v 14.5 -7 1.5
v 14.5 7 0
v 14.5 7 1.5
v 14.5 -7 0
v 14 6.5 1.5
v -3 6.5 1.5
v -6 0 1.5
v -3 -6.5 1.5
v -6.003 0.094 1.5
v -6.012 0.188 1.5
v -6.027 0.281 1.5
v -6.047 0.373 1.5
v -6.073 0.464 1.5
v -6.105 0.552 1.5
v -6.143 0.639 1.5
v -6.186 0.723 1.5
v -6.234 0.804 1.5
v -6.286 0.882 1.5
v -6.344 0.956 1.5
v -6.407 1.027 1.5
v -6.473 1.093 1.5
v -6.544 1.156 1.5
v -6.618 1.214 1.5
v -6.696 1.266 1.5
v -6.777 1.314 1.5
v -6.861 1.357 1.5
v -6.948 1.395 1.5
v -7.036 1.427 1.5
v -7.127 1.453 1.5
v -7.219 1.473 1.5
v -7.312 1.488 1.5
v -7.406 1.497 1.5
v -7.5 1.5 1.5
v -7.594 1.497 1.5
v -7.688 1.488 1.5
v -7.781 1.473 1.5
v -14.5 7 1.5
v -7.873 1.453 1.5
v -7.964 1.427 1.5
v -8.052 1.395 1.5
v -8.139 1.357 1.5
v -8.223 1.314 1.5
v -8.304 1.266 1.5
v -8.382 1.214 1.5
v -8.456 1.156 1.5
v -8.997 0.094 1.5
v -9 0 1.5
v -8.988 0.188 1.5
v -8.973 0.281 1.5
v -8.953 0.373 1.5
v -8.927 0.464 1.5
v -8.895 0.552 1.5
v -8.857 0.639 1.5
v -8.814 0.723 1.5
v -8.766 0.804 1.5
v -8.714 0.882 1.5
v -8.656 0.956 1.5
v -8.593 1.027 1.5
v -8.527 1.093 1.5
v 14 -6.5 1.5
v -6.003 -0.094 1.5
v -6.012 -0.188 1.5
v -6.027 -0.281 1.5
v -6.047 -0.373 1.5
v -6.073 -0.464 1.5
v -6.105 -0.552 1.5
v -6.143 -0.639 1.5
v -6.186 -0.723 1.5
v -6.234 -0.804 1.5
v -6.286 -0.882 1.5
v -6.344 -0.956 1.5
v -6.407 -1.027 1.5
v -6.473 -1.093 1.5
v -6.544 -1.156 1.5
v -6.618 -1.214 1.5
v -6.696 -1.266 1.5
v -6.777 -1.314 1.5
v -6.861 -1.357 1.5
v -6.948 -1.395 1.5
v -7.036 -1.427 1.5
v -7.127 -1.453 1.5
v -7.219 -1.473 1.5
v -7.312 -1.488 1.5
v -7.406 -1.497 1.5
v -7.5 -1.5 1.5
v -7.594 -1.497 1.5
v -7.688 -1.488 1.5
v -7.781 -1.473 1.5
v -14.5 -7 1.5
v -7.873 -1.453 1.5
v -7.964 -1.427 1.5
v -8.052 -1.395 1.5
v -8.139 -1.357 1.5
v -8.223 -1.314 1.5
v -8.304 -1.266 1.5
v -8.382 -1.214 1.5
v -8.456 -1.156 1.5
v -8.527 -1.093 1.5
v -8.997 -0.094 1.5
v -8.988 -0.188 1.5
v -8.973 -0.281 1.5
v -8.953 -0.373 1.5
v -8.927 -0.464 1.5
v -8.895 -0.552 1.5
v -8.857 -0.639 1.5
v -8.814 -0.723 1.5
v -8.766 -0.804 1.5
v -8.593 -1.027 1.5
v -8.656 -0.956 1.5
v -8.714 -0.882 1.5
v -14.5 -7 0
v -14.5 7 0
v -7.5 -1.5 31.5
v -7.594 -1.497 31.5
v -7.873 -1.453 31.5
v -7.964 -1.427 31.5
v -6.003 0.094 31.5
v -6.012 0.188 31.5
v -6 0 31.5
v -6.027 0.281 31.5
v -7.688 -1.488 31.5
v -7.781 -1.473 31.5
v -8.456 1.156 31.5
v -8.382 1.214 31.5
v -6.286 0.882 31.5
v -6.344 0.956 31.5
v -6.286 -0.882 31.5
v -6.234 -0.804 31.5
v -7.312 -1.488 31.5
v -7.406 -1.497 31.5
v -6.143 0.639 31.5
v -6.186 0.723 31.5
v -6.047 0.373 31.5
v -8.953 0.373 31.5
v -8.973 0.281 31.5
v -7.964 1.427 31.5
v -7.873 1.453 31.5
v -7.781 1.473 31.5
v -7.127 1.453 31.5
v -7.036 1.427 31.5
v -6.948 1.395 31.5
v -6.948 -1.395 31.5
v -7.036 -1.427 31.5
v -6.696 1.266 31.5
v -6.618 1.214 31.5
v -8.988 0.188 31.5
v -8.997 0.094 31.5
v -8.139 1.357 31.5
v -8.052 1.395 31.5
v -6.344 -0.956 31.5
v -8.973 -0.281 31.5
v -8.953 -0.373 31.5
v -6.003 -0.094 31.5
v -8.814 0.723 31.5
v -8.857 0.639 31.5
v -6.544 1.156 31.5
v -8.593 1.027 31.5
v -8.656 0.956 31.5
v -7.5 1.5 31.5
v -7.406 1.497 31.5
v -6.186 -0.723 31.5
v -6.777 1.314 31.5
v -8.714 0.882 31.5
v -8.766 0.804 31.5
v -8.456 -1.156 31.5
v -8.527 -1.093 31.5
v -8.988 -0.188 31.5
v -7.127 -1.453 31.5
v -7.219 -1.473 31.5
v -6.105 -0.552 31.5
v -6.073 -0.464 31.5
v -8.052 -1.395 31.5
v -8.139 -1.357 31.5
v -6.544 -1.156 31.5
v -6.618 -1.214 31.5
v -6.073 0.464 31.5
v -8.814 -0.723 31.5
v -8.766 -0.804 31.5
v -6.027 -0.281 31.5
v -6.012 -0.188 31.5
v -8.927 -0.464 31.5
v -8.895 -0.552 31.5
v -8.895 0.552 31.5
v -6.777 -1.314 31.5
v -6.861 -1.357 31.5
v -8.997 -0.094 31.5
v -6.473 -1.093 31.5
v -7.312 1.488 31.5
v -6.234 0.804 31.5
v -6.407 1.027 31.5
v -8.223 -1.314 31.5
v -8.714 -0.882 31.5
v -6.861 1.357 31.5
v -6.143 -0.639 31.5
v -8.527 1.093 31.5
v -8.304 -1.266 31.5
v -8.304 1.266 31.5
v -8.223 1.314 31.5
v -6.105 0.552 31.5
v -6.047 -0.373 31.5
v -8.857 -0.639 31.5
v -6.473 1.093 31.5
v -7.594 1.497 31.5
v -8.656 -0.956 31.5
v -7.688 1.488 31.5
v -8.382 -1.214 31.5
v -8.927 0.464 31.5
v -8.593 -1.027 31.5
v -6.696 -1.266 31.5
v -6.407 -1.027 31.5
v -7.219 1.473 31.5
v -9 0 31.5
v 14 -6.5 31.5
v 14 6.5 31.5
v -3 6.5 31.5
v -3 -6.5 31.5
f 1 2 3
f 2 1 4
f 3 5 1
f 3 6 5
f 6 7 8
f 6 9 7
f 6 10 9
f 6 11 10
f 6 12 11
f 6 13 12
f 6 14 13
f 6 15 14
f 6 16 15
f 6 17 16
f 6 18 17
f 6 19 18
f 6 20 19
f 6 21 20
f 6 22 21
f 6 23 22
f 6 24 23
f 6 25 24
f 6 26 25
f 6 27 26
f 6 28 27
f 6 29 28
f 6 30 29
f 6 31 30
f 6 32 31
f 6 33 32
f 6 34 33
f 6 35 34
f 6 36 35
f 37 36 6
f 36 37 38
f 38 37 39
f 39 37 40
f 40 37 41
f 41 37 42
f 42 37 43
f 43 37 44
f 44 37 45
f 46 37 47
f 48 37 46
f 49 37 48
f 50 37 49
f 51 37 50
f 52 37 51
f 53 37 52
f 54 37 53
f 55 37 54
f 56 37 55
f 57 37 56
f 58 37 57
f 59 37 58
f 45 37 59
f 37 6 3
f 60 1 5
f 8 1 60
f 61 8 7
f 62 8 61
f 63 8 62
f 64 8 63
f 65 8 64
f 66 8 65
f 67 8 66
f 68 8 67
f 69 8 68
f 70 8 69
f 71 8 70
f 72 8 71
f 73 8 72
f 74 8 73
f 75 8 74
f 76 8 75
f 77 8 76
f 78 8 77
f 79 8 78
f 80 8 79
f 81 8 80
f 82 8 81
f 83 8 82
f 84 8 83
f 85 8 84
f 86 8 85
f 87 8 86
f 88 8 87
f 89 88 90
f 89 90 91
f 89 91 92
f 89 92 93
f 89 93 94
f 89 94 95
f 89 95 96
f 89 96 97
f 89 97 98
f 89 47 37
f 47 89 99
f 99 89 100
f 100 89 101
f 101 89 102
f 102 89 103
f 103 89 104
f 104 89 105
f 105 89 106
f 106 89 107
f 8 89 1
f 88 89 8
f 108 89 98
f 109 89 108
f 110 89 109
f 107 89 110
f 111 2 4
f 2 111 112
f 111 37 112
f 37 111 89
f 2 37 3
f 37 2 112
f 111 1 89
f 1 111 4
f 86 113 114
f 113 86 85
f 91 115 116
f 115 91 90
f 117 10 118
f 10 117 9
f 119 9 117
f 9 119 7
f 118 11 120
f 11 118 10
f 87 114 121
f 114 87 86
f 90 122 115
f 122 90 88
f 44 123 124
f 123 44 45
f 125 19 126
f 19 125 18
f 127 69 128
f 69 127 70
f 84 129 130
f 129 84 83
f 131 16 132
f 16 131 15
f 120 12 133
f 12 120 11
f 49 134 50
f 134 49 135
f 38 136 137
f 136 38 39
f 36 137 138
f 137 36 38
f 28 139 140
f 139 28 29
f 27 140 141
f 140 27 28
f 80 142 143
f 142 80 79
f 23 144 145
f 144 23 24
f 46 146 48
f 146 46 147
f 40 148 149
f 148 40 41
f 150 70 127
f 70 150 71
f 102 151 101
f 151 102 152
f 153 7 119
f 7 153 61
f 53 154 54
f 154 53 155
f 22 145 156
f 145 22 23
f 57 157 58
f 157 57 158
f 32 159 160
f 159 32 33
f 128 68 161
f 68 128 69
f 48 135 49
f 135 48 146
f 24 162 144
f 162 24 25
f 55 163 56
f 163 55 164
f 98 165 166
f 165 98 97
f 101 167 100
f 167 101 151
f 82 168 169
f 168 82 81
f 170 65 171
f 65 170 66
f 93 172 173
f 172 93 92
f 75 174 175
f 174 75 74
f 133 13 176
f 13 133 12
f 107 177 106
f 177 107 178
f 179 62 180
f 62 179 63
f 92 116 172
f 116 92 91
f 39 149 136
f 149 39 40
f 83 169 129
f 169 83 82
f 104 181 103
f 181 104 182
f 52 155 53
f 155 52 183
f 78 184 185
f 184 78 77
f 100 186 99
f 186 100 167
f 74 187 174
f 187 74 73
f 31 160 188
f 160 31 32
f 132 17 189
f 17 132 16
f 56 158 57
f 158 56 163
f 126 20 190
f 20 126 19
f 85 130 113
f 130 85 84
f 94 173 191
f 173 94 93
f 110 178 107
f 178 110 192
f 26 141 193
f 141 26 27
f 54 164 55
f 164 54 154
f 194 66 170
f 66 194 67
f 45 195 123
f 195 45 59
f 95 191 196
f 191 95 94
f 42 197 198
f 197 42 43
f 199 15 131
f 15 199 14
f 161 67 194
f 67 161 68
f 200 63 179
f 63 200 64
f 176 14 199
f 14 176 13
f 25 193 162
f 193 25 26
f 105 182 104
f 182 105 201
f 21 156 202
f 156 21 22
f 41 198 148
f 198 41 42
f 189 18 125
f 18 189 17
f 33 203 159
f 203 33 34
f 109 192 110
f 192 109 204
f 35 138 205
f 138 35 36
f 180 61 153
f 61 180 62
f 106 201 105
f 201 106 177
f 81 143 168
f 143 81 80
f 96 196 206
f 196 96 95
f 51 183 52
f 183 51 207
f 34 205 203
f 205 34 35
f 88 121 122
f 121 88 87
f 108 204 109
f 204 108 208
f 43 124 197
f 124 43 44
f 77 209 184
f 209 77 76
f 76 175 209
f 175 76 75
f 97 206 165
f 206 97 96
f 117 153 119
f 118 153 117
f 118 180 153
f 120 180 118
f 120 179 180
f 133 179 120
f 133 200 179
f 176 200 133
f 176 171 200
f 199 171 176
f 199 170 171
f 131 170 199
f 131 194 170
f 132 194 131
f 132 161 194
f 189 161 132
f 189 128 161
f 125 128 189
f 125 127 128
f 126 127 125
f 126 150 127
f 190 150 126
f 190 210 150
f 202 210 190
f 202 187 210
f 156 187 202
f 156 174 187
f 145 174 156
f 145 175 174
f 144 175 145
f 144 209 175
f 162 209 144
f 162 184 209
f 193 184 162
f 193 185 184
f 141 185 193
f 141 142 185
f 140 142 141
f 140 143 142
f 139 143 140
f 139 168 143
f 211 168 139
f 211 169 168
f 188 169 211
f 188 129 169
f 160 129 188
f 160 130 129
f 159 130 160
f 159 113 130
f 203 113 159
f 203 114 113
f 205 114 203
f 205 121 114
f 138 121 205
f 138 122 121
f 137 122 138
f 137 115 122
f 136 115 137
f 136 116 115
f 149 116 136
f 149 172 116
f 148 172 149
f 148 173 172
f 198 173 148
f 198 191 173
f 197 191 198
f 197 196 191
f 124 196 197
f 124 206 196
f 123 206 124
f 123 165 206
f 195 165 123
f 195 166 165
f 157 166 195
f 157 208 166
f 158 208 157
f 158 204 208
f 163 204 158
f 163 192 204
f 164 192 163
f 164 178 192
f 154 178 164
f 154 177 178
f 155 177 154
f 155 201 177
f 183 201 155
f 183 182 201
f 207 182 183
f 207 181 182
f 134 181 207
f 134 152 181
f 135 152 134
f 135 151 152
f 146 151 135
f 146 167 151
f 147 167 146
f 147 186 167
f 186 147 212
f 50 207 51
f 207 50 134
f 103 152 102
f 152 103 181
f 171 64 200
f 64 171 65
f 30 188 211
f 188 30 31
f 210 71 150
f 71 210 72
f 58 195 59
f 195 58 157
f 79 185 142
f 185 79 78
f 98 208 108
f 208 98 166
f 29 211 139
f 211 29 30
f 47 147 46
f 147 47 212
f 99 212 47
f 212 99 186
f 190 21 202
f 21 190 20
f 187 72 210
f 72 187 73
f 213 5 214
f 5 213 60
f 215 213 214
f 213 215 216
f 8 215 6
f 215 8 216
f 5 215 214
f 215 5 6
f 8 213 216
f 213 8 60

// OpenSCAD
module ArduinoUNO(espesorArduino=1.6,taladroEntradas=10){
    
     /*
    medidas ARDUINO UNO
    68.6
    53.3
    12.5
    */
    
//tarjeta
cube([68.6,53.3,espesorArduino]);

//entrada DC
translate([-taladroEntradas,3.3,espesorArduino])
cube([taladroEntradas,8.9,10.9]);

//entrada USB
translate([-taladroEntradas,31.7,espesorArduino])
cube([taladroEntradas,12,10.9]);

//Led RX TX
    //se tomo la coordenada de los pines analogicos mas 30 en el eje "Y"
translate([13.6+12.5,1+30,espesorArduino])
cube([2,4,10.9+taladroEntradas]);

//Led RX TX
    //se tomo la coordenada de los LED RX TX más 4mm (+4 por la medida de las ventanas) en el eje "Y"
translate([13.6+12.5,1+30+8,espesorArduino])
cube([2,2,10.9+taladroEntradas]);

//entrada pines (analogicos)
translate([13.6+12.5,1,espesorArduino])
cube([33,2,10.9+taladroEntradas]);

//entrada pines (digitales + PWM)
translate([13.6+2.5,53.3-2-1,espesorArduino])
cube([48,2,10.9+taladroEntradas]);

//###Tornillos arduino#####
translate([13.6,3,0])
rotate([180,0,0])
cylinder($fn=100,d=3.2,h=taladroEntradas);


translate([13.6+51.9,3+4.7,0])
rotate([180,0,0])
cylinder($fn=100,d=3.2,h=taladroEntradas);

translate([13.6+51.9,3+4.7+27.9,0])
rotate([180,0,0])
cylinder($fn=100,d=3.2,h=taladroEntradas);

translate([13.6+1.1,3+4.7+27.9+15.2,0])
rotate([180,0,0])
cylinder($fn=100,d=3.2,h=taladroEntradas);

//boton arduino
 //se redujo 8 mm en eje "x" y se aumento 1mm en eje "y" del la coordenada del último tornillo
      translate([13.6+1.1-8,3+4.7+27.9+15.2-1,0])
       cylinder(d=3.2,$fn=100,h=10.9+taladroEntradas);

}


module RaspberryPi(taladroEntradas=10){
//Raspberry pi
    espesorTarjeta=1.6;
   
    medidaX=85;
    medidaY=56;
   
     /*
    medidas Rasberry Pi
     eje "x"= 85mm
     eje "y"= 56mm
      espesorTarjeta=1.6
    */
    
//tarjeta
cube([medidaX,medidaY,espesorTarjeta]);

//Conjunto USB
translate([medidaX,29-(14.3/2),espesorTarjeta])
cube([taladroEntradas,14.3,16]);

translate([medidaX,47-(14.3/2),espesorTarjeta])
cube([taladroEntradas,14.3,16]);

//Conector RJ45
translate([medidaX,10.25-(15.1/2),espesorTarjeta])
cube([taladroEntradas,15.1,13.5]);

//GPIO
translate([3.5*2,49,espesorTarjeta])
cube([52,6,8.5+taladroEntradas]);


//###TornillosRaspberry#####

translate([3.5,3.5,0])
rotate([180,0,0])
cylinder($fn=100,d=2.75,h=taladroEntradas);


translate([3.5+58,3.5,0])
rotate([180,0,0])
cylinder($fn=100,d=2.75,h=taladroEntradas);

translate([3.5,3.5+49,0])
rotate([180,0,0])
cylinder($fn=100,d=2.75,h=taladroEntradas);


translate([3.5+58,3.5+49,0])
rotate([180,0,0])
cylinder($fn=100,d=2.75,h=taladroEntradas);

}//fin raspberry Pi

module sensorMQ(taladroEntradas=20){
tornillos=3;
espesorSensor=1.5;
//taladroEntradas=20;

//tornillos
translate([2,2,espesorSensor])
cylinder(d=tornillos,h=taladroEntradas,$fn=100);

translate([2+27,2,espesorSensor])
cylinder(d=tornillos,h=taladroEntradas,$fn=100);

translate([2+27,20.3-2,espesorSensor])
cylinder(d=tornillos,h=taladroEntradas,$fn=100);

translate([2,20.3-2,espesorSensor])
cylinder(d=tornillos,h=taladroEntradas,$fn=100);

//sensor
translate([20,20.3/2,espesorSensor])
cylinder(d=20,h=taladroEntradas,$fn=100);

//tarjeta
cube([32,20.3,espesorSensor]);

}//fin sensor MQ

module sensorDHT11(taladroEntradas=20){

espesorSensor=1.5;
cube([29,14,espesorSensor]);

translate([7,14/2,espesorSensor])
cylinder(d=3,h=taladroEntradas,$fn=100);

translate([20,14/2,espesorSensor+taladroEntradas/2])
cube([17,13,taladroEntradas],center=true);

}
//#####RENDERIZADOS####

translate([-29/2,-14/2,0])
 sensorDHT11(30);

//translate([-32/2,-20.3/2,0])
//sensorMQ();

//ArduinoUNO();




 //RaspberryPi();
